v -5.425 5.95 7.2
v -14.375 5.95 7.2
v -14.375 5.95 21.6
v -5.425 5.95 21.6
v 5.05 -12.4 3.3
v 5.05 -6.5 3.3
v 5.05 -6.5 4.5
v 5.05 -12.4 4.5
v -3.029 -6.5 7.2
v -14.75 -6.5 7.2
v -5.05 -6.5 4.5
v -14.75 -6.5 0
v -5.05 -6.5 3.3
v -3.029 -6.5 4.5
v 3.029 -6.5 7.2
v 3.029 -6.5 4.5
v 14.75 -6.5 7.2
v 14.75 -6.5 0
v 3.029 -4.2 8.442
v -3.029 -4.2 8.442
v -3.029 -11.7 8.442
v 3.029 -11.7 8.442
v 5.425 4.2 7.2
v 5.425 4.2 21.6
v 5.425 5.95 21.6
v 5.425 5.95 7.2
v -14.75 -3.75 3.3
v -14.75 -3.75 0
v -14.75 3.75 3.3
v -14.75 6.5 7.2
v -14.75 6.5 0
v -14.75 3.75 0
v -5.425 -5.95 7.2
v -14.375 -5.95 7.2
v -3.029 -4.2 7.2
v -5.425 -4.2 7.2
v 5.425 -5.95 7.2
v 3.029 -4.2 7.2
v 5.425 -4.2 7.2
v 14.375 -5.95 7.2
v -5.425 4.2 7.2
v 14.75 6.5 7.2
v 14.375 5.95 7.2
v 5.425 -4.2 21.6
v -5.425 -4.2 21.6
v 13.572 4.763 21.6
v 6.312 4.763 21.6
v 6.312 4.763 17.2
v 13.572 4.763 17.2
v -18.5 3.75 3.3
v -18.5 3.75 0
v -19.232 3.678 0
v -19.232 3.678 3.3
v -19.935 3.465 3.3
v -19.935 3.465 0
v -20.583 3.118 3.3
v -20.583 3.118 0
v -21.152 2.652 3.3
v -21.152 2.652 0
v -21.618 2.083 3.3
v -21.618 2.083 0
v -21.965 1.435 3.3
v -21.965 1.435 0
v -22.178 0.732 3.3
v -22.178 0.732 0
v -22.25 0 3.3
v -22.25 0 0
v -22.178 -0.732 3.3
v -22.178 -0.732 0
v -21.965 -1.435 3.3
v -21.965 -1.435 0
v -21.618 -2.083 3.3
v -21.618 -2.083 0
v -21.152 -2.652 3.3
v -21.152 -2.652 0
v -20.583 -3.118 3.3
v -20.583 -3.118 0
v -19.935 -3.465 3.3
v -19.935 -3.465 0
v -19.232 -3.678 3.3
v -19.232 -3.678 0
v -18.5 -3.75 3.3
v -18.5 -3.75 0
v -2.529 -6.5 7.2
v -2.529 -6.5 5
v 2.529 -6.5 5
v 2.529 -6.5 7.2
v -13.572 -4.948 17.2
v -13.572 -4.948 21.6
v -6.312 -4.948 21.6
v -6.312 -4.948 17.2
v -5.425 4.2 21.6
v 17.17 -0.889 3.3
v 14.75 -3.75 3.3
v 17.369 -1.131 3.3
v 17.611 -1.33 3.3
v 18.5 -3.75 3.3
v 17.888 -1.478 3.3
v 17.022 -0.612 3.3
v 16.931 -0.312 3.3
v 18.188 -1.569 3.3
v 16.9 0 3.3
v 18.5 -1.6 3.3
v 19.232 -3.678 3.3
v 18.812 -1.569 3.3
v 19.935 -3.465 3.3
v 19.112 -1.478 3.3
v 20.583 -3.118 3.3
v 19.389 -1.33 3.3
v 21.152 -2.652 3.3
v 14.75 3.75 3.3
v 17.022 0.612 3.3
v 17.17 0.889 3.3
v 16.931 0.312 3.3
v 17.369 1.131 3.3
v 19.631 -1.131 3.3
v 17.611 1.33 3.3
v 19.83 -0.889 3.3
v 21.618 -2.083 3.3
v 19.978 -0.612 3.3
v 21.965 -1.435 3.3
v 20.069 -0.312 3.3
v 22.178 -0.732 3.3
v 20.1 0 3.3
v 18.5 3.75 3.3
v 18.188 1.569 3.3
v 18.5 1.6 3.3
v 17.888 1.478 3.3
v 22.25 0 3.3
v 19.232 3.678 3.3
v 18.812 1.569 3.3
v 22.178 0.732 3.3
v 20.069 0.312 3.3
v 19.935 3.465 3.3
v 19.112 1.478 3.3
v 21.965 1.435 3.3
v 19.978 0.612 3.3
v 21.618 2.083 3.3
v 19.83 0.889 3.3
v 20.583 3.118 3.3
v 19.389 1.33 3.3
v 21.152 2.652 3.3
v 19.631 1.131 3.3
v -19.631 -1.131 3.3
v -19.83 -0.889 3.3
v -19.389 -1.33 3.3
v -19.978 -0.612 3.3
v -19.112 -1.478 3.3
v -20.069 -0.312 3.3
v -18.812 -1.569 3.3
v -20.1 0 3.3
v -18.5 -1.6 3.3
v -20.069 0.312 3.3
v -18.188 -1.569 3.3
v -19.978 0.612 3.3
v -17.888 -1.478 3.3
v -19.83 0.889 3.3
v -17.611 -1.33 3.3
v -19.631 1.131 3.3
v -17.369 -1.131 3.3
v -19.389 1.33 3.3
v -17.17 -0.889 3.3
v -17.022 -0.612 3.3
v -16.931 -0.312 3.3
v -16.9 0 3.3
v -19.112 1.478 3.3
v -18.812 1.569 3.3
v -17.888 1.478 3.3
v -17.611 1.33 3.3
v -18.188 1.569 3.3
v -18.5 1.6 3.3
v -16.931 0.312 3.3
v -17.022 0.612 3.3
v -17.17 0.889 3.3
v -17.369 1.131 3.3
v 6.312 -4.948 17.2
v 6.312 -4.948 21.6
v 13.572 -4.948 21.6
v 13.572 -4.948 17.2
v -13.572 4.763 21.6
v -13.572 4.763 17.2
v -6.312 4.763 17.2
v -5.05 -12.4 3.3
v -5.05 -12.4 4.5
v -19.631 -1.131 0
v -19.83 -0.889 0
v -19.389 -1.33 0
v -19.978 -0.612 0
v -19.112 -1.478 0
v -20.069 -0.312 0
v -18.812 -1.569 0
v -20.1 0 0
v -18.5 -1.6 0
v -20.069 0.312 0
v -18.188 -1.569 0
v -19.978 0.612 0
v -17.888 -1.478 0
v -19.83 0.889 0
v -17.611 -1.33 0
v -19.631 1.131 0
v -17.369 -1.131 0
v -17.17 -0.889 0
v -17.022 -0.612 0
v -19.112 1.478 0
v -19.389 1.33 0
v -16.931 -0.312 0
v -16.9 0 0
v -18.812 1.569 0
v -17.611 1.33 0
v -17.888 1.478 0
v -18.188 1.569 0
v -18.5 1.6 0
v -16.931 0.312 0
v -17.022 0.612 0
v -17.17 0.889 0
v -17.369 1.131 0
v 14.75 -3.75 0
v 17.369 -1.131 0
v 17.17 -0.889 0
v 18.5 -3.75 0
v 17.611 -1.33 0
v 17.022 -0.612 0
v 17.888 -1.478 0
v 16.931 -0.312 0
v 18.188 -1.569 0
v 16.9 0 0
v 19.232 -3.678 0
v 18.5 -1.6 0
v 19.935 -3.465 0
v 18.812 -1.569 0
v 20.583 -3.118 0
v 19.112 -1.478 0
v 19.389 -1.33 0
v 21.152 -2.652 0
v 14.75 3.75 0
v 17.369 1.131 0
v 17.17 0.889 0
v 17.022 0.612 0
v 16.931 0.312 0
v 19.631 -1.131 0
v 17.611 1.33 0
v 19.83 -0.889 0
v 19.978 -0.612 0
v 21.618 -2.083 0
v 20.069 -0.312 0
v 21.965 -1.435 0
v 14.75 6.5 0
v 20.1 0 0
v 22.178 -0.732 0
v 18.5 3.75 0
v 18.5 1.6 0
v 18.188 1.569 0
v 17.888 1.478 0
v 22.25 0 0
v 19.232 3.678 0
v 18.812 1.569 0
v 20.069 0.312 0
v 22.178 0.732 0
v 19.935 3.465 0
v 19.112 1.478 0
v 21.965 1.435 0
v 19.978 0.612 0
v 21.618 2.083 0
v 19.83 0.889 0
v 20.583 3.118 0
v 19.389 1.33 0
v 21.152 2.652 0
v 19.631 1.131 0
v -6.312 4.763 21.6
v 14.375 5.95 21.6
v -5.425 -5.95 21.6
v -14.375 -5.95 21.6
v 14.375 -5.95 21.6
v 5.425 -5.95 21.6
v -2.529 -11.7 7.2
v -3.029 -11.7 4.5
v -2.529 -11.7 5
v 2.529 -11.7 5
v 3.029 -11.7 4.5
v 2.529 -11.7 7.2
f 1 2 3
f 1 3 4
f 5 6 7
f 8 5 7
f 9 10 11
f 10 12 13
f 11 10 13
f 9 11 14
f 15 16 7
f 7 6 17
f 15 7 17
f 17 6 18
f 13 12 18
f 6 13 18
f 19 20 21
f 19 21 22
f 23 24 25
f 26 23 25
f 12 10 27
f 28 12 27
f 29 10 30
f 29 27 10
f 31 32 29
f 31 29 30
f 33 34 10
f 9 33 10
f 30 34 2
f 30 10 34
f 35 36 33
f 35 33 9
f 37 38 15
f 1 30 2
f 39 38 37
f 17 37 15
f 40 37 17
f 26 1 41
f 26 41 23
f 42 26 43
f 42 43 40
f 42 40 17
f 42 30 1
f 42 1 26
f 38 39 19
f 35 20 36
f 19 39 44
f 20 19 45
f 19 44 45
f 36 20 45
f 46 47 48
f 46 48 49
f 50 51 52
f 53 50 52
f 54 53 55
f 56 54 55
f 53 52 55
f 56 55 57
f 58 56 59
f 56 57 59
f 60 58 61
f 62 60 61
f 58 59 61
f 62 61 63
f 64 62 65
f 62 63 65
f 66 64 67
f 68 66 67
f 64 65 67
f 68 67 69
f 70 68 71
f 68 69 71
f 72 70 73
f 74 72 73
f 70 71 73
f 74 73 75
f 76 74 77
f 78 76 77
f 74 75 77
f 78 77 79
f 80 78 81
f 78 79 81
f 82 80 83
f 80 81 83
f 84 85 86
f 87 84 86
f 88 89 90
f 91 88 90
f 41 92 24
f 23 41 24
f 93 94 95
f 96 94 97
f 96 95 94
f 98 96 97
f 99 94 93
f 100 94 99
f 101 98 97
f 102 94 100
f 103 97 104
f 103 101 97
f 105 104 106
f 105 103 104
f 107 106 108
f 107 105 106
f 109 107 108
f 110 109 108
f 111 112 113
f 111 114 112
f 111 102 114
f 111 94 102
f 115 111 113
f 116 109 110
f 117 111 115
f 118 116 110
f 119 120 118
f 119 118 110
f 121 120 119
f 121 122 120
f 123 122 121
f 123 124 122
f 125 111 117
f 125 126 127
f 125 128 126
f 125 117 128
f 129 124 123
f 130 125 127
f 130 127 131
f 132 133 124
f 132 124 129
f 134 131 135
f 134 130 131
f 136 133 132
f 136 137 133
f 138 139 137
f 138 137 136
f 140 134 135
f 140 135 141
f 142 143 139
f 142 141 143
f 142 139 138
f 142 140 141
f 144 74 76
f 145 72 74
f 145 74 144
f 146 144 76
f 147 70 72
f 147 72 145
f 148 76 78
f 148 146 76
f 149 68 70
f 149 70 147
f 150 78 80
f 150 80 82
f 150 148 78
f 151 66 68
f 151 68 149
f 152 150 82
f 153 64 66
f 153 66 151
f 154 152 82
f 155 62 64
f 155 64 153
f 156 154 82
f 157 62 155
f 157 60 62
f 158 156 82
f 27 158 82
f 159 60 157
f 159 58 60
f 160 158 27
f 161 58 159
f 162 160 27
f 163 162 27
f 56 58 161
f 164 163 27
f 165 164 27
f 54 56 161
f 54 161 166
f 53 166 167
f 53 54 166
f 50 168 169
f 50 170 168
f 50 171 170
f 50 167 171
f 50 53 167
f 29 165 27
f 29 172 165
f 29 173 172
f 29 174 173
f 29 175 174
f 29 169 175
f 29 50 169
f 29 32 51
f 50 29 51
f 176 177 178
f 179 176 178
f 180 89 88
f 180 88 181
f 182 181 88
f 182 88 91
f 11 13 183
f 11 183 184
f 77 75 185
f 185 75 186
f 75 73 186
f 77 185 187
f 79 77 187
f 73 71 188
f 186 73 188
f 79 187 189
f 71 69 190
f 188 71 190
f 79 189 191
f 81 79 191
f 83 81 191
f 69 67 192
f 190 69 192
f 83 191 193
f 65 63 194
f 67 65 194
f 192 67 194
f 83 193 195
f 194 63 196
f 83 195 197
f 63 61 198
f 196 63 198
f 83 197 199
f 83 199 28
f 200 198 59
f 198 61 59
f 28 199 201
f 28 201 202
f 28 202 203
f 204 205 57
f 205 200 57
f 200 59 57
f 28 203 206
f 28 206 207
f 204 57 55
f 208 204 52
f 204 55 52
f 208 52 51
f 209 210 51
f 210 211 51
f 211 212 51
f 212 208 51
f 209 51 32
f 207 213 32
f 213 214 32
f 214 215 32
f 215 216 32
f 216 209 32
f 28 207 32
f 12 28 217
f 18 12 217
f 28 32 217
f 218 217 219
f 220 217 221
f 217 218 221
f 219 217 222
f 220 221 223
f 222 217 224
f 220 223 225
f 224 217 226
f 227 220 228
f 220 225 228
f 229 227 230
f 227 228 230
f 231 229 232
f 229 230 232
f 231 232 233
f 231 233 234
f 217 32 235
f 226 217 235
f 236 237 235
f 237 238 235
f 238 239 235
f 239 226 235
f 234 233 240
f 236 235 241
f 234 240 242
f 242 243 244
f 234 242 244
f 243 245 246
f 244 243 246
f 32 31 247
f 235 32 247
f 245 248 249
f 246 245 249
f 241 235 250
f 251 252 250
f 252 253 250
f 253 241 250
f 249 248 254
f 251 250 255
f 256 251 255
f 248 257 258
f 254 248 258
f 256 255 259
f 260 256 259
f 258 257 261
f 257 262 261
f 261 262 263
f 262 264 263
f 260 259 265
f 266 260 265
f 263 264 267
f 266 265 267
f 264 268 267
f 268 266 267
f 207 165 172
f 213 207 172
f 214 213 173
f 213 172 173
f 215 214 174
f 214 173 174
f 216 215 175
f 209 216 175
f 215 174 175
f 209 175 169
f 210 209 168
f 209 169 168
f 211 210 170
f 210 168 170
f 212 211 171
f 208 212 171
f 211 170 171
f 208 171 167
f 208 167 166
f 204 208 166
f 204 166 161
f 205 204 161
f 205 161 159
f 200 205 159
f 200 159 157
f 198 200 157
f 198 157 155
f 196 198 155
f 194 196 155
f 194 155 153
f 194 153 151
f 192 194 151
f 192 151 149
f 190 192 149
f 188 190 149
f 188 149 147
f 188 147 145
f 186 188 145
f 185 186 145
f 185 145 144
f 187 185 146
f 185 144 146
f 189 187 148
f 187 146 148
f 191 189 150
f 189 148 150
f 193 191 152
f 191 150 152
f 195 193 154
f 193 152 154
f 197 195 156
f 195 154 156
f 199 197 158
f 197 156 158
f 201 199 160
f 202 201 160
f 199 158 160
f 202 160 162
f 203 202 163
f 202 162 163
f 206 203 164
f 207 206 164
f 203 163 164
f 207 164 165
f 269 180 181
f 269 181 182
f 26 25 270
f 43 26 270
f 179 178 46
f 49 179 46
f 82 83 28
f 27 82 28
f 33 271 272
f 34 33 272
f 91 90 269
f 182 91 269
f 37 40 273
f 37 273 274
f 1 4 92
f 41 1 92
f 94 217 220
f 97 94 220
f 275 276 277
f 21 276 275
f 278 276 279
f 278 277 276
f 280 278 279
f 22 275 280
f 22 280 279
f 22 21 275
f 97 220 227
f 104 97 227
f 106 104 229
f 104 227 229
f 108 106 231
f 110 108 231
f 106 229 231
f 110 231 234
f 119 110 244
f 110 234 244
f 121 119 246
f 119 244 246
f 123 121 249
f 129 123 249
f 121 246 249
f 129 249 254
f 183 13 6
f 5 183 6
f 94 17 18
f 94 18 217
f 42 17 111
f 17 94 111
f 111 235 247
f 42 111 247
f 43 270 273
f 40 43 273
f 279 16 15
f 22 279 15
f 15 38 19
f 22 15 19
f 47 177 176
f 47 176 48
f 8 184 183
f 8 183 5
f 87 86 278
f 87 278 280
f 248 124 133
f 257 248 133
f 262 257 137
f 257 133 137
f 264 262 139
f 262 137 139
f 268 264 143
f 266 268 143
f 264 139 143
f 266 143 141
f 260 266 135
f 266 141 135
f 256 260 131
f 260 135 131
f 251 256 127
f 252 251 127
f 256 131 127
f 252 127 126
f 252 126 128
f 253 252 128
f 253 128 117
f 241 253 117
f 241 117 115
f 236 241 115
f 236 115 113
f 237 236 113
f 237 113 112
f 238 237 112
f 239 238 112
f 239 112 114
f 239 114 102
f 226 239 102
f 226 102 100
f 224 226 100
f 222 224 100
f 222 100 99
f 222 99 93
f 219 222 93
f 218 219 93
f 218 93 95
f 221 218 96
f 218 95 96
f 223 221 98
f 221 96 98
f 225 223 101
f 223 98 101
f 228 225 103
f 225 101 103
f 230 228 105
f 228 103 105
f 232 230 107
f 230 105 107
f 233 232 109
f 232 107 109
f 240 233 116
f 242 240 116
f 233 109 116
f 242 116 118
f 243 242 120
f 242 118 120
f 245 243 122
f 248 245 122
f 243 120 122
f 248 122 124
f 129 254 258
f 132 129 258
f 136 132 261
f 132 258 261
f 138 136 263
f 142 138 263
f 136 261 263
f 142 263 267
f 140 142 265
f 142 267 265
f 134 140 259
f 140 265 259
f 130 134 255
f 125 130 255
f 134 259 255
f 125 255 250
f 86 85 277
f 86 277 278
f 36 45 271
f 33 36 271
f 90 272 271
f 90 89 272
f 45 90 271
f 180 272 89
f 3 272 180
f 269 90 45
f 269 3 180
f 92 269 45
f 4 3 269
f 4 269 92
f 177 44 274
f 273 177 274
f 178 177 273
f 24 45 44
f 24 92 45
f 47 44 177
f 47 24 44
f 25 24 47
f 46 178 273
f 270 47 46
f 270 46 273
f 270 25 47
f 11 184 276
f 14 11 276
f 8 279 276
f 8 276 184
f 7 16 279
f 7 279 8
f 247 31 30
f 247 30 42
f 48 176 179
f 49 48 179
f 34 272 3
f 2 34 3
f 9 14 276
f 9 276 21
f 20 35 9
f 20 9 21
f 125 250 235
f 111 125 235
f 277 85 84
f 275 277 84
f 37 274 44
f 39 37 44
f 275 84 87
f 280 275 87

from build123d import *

# Parameters (mm, degrees)
EXTRUDE_1_DEPTH       = 3.3
SKETCH_1_3_W          = 29.5
SKETCH_1_3_H          = 13
EXTRUDE_2_DEPTH       = 21.6
SKETCH_3_W            = 29.5
SKETCH_3_H            = 13
CUT_EXTRUDE_1_DEPTH   = 14.4
SKETCH_4_W            = 7.25988549
SKETCH_4_H            = 9.71067486
CUT_EXTRUDE_2_DEPTH   = 4.4
SKETCH_5_W            = 10.1
SKETCH_5_H            = 1.2
EXTRUDE_3_DEPTH       = 8.2
EXTRUDE_4_OUTLINE_W   = 6.05761146
EXTRUDE_4_OUTLINE_H   = 3.941693248
EXTRUDE_4_OUTLINE_W_2 = 5.05761146
EXTRUDE_4_OUTLINE_H_2 = 2.2
EXTRUDE_4_DEPTH       = 7.5
SKETCH_6_R            = 1.6
CUT_EXTRUDE_3_DEPTH   = 7.5


# Read off the part's stored shape, not the designer's step: 凸台-拉伸4
with BuildPart() as part:
    # 草图1 → 凸台-拉伸1 (new body)
    with BuildSketch(Plane.XY):
        with BuildLine():
            ThreePointArc((-18.5, 3.75), (-22.25, 0), (-18.5, -3.75))
            Line((-18.5, -3.75), (-18.5, 3.75))
        make_face()
        with BuildLine():
            Line((-18.5, 3.75), (-18.5, -3.75))
            ThreePointArc((-18.5, -3.75), (-15.848349571, -2.651650429), (-14.75, 0))
            ThreePointArc((-14.75, 0), (-15.848349571, 2.651650429), (-18.5, 3.75))
        make_face()
        with BuildLine():
            Line((-14.75, 3.75), (-18.5, 3.75))
            ThreePointArc((-18.5, 3.75), (-15.848349571, 2.651650429), (-14.75, 0))
            Line((-14.75, 0), (-14.75, 3.75))
        make_face()
        with BuildLine():
            ThreePointArc((-14.75, 0), (-15.848349571, -2.651650429), (-18.5, -3.75))
            Line((-18.5, -3.75), (-14.75, -3.75))
            Line((-14.75, -3.75), (-14.75, 0))
        make_face()
        Polygon((-14.75, 0), (-14.75, -3.75), (14.75, -3.75), (14.75, -4e-09), (14.75, 3.75), (-14.75, 3.75), align=None)
        with BuildLine():
            ThreePointArc((14.75, -4e-09), (15.848349572, -2.651650431), (18.5, -3.75))
            Line((18.5, -3.75), (18.5, 3.75))
            ThreePointArc((18.5, 3.75), (15.848349569, 2.651650428), (14.75, -4e-09))
        make_face()
        with BuildLine():
            Line((18.5, 3.75), (18.5, -3.75))
            ThreePointArc((18.5, -3.75), (21.151650429, -2.651650429), (22.25, 0))
            ThreePointArc((22.25, 0), (21.151650429, 2.651650429), (18.5, 3.75))
        make_face()
        with BuildLine():
            Line((14.75, 3.75), (14.75, -4e-09))
            ThreePointArc((14.75, -4e-09), (15.848349569, 2.651650428), (18.5, 3.75))
            Line((18.5, 3.75), (14.75, 3.75))
        make_face()
        with BuildLine():
            Line((14.75, -4e-09), (14.75, -3.75))
            Line((14.75, -3.75), (18.5, -3.75))
            ThreePointArc((18.5, -3.75), (15.848349572, -2.651650431), (14.75, -4e-09))
        make_face()
    extrude(amount=EXTRUDE_1_DEPTH)

    # 草图1<3> → 凸台-拉伸2 (add)
    with BuildSketch(Plane.XY):
        Rectangle(SKETCH_1_3_W, SKETCH_1_3_H)
    extrude(amount=EXTRUDE_2_DEPTH)

    # 草图3 → 切除-拉伸1 (cut)
    with BuildSketch(Plane.XY.offset(21.6)):
        Rectangle(SKETCH_3_W, SKETCH_3_H)
        Polygon((-14.375, -5.95), (-14.375, 5.95), (-5.425, 5.95), (-5.425, 4.2), (5.425, 4.2), (5.425, 5.95), (14.375, 5.95), (14.375, -5.95), (5.425, -5.95), (5.425, -4.2), (-5.425, -4.2), (-5.425, -5.95), align=None, mode=Mode.SUBTRACT)
    extrude(amount=-CUT_EXTRUDE_1_DEPTH, mode=Mode.SUBTRACT)

    # 草图4 → 切除-拉伸2 (cut)
    with BuildSketch(Plane.XY.offset(21.6)):
        with Locations((-9.941881404, -0.092482618)):
            Rectangle(SKETCH_4_W, SKETCH_4_H)
        with Locations((9.941881404, -0.092482618)):
            Rectangle(SKETCH_4_W, SKETCH_4_H)
    extrude(amount=-CUT_EXTRUDE_2_DEPTH, mode=Mode.SUBTRACT)

    # 草图5 → 凸台-拉伸3 (add)
    with BuildSketch(Plane.XZ.offset(4.2)):
        with Locations((0, 3.9)):
            Rectangle(SKETCH_5_W, SKETCH_5_H)
    extrude(amount=EXTRUDE_3_DEPTH)

    # 凸台-拉伸4 outline → 凸台-拉伸4 (add)
    with BuildSketch(Plane.XZ.offset(4.2)):
        with Locations((0, 6.470846624)):
            Rectangle(EXTRUDE_4_OUTLINE_W, EXTRUDE_4_OUTLINE_H)
        with Locations((0, 6.1)):
            Rectangle(EXTRUDE_4_OUTLINE_W_2, EXTRUDE_4_OUTLINE_H_2, mode=Mode.SUBTRACT)
    extrude(amount=EXTRUDE_4_DEPTH)

    # 草图6 → 切除-拉伸3 (cut)
    with BuildSketch(Plane.XY.offset(3.3)):
        with Locations((-18.5, 0)):
            Circle(SKETCH_6_R)
        with Locations((18.5, 0)):
            Circle(SKETCH_6_R)
    extrude(amount=-CUT_EXTRUDE_3_DEPTH, mode=Mode.SUBTRACT)


solid = part.part
